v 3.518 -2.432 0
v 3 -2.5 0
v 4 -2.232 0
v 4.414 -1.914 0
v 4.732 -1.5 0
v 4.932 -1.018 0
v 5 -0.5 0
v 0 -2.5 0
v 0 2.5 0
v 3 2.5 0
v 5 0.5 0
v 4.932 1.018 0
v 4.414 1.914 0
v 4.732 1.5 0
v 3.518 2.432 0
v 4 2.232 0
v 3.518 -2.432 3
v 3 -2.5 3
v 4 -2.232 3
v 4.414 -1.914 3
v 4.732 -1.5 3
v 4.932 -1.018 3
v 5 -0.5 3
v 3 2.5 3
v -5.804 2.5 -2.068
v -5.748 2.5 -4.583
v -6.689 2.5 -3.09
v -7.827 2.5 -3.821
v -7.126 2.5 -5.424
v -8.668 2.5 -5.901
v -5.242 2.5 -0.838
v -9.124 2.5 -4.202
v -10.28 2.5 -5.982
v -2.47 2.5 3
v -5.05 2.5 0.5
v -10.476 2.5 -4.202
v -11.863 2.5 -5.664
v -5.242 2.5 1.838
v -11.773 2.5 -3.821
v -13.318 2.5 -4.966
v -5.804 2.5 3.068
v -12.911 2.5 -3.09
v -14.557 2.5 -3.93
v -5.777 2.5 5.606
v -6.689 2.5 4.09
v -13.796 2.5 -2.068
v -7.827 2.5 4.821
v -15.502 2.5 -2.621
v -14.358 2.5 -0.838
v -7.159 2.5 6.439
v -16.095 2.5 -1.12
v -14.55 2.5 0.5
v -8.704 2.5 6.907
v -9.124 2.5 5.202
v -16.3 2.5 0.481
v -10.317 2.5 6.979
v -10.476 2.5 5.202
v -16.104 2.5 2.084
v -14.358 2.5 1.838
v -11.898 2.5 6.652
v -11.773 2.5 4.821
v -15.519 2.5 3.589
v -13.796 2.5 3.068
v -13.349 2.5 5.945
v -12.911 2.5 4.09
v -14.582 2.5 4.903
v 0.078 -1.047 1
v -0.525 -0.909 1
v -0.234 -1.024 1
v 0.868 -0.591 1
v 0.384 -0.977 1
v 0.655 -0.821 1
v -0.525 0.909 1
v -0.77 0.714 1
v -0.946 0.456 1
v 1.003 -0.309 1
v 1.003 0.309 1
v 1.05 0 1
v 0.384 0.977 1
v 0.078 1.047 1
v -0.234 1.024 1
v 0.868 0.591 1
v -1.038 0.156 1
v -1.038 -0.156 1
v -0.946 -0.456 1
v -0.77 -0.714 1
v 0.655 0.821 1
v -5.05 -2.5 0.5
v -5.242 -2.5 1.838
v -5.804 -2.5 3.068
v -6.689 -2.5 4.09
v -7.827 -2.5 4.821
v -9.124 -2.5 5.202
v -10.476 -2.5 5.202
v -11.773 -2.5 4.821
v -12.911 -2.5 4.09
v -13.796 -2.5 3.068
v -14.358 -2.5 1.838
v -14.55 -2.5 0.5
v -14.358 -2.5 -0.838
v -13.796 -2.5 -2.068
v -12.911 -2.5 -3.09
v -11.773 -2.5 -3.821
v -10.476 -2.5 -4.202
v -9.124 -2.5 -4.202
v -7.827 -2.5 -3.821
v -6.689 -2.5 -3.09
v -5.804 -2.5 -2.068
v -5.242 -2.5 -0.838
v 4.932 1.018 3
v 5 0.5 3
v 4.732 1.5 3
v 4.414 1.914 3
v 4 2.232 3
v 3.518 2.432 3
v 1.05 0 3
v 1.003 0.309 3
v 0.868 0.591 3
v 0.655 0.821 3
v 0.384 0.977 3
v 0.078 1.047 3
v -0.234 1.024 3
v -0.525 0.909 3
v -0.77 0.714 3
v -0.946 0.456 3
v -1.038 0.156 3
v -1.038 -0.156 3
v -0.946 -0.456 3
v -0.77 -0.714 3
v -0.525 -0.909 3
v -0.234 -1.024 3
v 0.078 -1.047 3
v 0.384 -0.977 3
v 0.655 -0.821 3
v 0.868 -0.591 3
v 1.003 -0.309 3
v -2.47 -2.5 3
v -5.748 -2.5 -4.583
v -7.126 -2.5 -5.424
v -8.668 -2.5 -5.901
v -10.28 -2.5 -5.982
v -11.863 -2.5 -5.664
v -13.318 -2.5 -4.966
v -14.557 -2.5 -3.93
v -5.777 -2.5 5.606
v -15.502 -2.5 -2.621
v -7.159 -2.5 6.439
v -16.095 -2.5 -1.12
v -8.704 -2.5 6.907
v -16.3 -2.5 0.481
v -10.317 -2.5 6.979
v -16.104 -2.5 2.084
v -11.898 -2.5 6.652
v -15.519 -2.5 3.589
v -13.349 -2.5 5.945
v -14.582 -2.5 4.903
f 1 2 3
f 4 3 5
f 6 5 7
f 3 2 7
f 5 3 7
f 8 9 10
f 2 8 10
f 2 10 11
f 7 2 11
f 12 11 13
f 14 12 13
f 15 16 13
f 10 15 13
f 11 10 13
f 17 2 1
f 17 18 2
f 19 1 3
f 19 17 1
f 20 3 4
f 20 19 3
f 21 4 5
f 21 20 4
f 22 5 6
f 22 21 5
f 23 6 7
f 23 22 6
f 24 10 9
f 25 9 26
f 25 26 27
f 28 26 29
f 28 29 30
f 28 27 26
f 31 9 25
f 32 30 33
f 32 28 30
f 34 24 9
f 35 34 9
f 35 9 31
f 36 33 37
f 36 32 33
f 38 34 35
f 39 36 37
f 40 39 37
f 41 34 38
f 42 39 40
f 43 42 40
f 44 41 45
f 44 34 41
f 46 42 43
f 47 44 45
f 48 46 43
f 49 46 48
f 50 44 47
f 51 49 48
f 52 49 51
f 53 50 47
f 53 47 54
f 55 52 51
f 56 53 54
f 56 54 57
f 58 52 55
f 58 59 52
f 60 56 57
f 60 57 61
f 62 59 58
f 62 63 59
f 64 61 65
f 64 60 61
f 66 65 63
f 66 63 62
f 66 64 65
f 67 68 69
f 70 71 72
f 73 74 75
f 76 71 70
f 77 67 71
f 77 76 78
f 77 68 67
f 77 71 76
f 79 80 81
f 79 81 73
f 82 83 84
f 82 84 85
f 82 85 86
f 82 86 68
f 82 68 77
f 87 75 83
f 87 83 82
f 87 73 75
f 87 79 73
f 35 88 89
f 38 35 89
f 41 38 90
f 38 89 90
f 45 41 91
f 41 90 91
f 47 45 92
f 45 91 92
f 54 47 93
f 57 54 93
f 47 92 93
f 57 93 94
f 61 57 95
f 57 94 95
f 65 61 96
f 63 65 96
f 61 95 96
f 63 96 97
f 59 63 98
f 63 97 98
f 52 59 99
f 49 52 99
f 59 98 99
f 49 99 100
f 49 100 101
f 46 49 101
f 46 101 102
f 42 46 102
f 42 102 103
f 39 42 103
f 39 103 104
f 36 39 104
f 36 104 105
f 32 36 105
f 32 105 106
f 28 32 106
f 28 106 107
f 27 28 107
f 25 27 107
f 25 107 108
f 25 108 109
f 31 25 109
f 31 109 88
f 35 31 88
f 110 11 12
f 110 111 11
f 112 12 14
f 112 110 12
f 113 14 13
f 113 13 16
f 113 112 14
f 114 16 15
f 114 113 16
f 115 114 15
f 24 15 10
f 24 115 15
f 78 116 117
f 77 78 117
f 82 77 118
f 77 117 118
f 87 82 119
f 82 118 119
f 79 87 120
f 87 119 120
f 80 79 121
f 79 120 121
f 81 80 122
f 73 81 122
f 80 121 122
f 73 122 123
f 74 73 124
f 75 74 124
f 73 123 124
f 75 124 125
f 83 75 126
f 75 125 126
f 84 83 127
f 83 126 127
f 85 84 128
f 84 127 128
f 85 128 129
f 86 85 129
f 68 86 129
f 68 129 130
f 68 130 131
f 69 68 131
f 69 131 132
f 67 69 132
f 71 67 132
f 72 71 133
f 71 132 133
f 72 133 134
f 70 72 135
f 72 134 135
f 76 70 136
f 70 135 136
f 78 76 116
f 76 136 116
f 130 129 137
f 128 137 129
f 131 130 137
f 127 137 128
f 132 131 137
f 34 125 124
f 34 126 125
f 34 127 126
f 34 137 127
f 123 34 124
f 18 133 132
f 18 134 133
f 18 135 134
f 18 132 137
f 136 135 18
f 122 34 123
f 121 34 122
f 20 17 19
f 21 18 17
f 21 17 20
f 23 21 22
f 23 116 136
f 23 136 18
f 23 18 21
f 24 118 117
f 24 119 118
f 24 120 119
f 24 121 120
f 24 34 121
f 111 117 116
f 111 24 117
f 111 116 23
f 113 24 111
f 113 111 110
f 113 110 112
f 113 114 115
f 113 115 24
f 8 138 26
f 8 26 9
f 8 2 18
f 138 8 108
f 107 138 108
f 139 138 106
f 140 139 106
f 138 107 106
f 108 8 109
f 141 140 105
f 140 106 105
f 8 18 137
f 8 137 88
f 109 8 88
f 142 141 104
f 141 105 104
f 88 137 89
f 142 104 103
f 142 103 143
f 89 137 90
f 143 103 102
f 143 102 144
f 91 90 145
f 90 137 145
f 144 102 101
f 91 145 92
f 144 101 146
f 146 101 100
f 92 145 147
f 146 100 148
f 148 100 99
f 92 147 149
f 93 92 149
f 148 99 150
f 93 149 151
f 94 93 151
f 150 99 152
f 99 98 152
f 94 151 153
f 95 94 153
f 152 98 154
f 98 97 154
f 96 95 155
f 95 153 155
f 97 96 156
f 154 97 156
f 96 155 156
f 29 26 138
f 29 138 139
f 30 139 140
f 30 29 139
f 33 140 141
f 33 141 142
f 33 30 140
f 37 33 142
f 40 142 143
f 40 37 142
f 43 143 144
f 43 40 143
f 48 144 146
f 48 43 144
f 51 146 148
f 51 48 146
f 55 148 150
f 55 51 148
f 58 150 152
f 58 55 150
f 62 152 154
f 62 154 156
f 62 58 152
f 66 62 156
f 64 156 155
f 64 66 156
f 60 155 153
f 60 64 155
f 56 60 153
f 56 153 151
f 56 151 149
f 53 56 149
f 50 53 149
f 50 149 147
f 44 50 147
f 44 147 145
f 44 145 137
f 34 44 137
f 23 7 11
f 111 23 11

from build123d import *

# Parameters (mm, degrees)
SKETCH1_W           = 10
SKETCH1_H           = 5
BOSS_EXTRUDE1_DEPTH = 3
FILLET1_R           = 2
SKETCH3_R           = 6.5
BOSS_EXTRUDE2_DEPTH = 2.5
SKETCH4_R           = 4.75
CUT_EXTRUDE1_DEPTH  = 6
SKETCH7_R           = 1.05
CUT_EXTRUDE2_DEPTH  = 2
BOSS_EXTRUDE3_DEPTH = 5


with BuildPart() as part:
    # Sketch1 → Boss-Extrude1 (new body)
    with BuildSketch(Plane.XY):
        Rectangle(SKETCH1_W, SKETCH1_H)
    extrude(amount=BOSS_EXTRUDE1_DEPTH)

    # Fillet1
    fillet1_edges = [part.edges().sort_by_distance(p)[0] for p in [
        (5, 2.5, 1.5),
        (5, -2.5, 1.5),
    ]]
    fillet(fillet1_edges, radius=FILLET1_R)

    # Sketch7 → Cut-Extrude2 (cut)
    with BuildSketch(Plane.XY.offset(3)):
        Circle(SKETCH7_R)
    extrude(amount=-CUT_EXTRUDE2_DEPTH, mode=Mode.SUBTRACT)



with BuildPart() as body_2:
    # Sketch3 → Boss-Extrude2 (new body, symmetric)
    with BuildSketch(Plane(origin=(0, 0, 0), x_dir=(1, 0, 0), z_dir=(0, 1, 0))):
        with Locations((-9.8, -0.5)):
            Circle(SKETCH3_R)
    extrude(amount=BOSS_EXTRUDE2_DEPTH, both=True)

    # Sketch4 → Cut-Extrude1 (cut, through all)
    with BuildSketch(Plane.XZ.offset(2.5)):
        with Locations((-9.8, 0.5)):
            Circle(SKETCH4_R)
    extrude(amount=-CUT_EXTRUDE1_DEPTH, mode=Mode.SUBTRACT)


with BuildPart() as part_1:
    add(part.part)

    add(body_2.part)  # Boss-Extrude3 merges body 2
    # Sketch8 → Boss-Extrude3 (add)
    with BuildSketch(Plane.XZ.offset(2.5)):
        with BuildLine():
            Line((-5.77711019, 5.605522263), (-2.470394732, 3))
            Line((-2.470394732, 3), (-3.8, 3))
            ThreePointArc((-3.8, 3), (-4.621992024, 4.42915174), (-5.77711019, 5.605522263))
        make_face()
        with BuildLine():
            Line((-5.748087743, -4.582519755), (0, 0))
            Line((0, 0), (-3.319259302, 0))
            ThreePointArc((-3.319259302, 0), (-4.056824363, -2.543999606), (-5.748087743, -4.582519755))
        make_face()
    extrude(amount=-BOSS_EXTRUDE3_DEPTH)


solid = part_1.part
